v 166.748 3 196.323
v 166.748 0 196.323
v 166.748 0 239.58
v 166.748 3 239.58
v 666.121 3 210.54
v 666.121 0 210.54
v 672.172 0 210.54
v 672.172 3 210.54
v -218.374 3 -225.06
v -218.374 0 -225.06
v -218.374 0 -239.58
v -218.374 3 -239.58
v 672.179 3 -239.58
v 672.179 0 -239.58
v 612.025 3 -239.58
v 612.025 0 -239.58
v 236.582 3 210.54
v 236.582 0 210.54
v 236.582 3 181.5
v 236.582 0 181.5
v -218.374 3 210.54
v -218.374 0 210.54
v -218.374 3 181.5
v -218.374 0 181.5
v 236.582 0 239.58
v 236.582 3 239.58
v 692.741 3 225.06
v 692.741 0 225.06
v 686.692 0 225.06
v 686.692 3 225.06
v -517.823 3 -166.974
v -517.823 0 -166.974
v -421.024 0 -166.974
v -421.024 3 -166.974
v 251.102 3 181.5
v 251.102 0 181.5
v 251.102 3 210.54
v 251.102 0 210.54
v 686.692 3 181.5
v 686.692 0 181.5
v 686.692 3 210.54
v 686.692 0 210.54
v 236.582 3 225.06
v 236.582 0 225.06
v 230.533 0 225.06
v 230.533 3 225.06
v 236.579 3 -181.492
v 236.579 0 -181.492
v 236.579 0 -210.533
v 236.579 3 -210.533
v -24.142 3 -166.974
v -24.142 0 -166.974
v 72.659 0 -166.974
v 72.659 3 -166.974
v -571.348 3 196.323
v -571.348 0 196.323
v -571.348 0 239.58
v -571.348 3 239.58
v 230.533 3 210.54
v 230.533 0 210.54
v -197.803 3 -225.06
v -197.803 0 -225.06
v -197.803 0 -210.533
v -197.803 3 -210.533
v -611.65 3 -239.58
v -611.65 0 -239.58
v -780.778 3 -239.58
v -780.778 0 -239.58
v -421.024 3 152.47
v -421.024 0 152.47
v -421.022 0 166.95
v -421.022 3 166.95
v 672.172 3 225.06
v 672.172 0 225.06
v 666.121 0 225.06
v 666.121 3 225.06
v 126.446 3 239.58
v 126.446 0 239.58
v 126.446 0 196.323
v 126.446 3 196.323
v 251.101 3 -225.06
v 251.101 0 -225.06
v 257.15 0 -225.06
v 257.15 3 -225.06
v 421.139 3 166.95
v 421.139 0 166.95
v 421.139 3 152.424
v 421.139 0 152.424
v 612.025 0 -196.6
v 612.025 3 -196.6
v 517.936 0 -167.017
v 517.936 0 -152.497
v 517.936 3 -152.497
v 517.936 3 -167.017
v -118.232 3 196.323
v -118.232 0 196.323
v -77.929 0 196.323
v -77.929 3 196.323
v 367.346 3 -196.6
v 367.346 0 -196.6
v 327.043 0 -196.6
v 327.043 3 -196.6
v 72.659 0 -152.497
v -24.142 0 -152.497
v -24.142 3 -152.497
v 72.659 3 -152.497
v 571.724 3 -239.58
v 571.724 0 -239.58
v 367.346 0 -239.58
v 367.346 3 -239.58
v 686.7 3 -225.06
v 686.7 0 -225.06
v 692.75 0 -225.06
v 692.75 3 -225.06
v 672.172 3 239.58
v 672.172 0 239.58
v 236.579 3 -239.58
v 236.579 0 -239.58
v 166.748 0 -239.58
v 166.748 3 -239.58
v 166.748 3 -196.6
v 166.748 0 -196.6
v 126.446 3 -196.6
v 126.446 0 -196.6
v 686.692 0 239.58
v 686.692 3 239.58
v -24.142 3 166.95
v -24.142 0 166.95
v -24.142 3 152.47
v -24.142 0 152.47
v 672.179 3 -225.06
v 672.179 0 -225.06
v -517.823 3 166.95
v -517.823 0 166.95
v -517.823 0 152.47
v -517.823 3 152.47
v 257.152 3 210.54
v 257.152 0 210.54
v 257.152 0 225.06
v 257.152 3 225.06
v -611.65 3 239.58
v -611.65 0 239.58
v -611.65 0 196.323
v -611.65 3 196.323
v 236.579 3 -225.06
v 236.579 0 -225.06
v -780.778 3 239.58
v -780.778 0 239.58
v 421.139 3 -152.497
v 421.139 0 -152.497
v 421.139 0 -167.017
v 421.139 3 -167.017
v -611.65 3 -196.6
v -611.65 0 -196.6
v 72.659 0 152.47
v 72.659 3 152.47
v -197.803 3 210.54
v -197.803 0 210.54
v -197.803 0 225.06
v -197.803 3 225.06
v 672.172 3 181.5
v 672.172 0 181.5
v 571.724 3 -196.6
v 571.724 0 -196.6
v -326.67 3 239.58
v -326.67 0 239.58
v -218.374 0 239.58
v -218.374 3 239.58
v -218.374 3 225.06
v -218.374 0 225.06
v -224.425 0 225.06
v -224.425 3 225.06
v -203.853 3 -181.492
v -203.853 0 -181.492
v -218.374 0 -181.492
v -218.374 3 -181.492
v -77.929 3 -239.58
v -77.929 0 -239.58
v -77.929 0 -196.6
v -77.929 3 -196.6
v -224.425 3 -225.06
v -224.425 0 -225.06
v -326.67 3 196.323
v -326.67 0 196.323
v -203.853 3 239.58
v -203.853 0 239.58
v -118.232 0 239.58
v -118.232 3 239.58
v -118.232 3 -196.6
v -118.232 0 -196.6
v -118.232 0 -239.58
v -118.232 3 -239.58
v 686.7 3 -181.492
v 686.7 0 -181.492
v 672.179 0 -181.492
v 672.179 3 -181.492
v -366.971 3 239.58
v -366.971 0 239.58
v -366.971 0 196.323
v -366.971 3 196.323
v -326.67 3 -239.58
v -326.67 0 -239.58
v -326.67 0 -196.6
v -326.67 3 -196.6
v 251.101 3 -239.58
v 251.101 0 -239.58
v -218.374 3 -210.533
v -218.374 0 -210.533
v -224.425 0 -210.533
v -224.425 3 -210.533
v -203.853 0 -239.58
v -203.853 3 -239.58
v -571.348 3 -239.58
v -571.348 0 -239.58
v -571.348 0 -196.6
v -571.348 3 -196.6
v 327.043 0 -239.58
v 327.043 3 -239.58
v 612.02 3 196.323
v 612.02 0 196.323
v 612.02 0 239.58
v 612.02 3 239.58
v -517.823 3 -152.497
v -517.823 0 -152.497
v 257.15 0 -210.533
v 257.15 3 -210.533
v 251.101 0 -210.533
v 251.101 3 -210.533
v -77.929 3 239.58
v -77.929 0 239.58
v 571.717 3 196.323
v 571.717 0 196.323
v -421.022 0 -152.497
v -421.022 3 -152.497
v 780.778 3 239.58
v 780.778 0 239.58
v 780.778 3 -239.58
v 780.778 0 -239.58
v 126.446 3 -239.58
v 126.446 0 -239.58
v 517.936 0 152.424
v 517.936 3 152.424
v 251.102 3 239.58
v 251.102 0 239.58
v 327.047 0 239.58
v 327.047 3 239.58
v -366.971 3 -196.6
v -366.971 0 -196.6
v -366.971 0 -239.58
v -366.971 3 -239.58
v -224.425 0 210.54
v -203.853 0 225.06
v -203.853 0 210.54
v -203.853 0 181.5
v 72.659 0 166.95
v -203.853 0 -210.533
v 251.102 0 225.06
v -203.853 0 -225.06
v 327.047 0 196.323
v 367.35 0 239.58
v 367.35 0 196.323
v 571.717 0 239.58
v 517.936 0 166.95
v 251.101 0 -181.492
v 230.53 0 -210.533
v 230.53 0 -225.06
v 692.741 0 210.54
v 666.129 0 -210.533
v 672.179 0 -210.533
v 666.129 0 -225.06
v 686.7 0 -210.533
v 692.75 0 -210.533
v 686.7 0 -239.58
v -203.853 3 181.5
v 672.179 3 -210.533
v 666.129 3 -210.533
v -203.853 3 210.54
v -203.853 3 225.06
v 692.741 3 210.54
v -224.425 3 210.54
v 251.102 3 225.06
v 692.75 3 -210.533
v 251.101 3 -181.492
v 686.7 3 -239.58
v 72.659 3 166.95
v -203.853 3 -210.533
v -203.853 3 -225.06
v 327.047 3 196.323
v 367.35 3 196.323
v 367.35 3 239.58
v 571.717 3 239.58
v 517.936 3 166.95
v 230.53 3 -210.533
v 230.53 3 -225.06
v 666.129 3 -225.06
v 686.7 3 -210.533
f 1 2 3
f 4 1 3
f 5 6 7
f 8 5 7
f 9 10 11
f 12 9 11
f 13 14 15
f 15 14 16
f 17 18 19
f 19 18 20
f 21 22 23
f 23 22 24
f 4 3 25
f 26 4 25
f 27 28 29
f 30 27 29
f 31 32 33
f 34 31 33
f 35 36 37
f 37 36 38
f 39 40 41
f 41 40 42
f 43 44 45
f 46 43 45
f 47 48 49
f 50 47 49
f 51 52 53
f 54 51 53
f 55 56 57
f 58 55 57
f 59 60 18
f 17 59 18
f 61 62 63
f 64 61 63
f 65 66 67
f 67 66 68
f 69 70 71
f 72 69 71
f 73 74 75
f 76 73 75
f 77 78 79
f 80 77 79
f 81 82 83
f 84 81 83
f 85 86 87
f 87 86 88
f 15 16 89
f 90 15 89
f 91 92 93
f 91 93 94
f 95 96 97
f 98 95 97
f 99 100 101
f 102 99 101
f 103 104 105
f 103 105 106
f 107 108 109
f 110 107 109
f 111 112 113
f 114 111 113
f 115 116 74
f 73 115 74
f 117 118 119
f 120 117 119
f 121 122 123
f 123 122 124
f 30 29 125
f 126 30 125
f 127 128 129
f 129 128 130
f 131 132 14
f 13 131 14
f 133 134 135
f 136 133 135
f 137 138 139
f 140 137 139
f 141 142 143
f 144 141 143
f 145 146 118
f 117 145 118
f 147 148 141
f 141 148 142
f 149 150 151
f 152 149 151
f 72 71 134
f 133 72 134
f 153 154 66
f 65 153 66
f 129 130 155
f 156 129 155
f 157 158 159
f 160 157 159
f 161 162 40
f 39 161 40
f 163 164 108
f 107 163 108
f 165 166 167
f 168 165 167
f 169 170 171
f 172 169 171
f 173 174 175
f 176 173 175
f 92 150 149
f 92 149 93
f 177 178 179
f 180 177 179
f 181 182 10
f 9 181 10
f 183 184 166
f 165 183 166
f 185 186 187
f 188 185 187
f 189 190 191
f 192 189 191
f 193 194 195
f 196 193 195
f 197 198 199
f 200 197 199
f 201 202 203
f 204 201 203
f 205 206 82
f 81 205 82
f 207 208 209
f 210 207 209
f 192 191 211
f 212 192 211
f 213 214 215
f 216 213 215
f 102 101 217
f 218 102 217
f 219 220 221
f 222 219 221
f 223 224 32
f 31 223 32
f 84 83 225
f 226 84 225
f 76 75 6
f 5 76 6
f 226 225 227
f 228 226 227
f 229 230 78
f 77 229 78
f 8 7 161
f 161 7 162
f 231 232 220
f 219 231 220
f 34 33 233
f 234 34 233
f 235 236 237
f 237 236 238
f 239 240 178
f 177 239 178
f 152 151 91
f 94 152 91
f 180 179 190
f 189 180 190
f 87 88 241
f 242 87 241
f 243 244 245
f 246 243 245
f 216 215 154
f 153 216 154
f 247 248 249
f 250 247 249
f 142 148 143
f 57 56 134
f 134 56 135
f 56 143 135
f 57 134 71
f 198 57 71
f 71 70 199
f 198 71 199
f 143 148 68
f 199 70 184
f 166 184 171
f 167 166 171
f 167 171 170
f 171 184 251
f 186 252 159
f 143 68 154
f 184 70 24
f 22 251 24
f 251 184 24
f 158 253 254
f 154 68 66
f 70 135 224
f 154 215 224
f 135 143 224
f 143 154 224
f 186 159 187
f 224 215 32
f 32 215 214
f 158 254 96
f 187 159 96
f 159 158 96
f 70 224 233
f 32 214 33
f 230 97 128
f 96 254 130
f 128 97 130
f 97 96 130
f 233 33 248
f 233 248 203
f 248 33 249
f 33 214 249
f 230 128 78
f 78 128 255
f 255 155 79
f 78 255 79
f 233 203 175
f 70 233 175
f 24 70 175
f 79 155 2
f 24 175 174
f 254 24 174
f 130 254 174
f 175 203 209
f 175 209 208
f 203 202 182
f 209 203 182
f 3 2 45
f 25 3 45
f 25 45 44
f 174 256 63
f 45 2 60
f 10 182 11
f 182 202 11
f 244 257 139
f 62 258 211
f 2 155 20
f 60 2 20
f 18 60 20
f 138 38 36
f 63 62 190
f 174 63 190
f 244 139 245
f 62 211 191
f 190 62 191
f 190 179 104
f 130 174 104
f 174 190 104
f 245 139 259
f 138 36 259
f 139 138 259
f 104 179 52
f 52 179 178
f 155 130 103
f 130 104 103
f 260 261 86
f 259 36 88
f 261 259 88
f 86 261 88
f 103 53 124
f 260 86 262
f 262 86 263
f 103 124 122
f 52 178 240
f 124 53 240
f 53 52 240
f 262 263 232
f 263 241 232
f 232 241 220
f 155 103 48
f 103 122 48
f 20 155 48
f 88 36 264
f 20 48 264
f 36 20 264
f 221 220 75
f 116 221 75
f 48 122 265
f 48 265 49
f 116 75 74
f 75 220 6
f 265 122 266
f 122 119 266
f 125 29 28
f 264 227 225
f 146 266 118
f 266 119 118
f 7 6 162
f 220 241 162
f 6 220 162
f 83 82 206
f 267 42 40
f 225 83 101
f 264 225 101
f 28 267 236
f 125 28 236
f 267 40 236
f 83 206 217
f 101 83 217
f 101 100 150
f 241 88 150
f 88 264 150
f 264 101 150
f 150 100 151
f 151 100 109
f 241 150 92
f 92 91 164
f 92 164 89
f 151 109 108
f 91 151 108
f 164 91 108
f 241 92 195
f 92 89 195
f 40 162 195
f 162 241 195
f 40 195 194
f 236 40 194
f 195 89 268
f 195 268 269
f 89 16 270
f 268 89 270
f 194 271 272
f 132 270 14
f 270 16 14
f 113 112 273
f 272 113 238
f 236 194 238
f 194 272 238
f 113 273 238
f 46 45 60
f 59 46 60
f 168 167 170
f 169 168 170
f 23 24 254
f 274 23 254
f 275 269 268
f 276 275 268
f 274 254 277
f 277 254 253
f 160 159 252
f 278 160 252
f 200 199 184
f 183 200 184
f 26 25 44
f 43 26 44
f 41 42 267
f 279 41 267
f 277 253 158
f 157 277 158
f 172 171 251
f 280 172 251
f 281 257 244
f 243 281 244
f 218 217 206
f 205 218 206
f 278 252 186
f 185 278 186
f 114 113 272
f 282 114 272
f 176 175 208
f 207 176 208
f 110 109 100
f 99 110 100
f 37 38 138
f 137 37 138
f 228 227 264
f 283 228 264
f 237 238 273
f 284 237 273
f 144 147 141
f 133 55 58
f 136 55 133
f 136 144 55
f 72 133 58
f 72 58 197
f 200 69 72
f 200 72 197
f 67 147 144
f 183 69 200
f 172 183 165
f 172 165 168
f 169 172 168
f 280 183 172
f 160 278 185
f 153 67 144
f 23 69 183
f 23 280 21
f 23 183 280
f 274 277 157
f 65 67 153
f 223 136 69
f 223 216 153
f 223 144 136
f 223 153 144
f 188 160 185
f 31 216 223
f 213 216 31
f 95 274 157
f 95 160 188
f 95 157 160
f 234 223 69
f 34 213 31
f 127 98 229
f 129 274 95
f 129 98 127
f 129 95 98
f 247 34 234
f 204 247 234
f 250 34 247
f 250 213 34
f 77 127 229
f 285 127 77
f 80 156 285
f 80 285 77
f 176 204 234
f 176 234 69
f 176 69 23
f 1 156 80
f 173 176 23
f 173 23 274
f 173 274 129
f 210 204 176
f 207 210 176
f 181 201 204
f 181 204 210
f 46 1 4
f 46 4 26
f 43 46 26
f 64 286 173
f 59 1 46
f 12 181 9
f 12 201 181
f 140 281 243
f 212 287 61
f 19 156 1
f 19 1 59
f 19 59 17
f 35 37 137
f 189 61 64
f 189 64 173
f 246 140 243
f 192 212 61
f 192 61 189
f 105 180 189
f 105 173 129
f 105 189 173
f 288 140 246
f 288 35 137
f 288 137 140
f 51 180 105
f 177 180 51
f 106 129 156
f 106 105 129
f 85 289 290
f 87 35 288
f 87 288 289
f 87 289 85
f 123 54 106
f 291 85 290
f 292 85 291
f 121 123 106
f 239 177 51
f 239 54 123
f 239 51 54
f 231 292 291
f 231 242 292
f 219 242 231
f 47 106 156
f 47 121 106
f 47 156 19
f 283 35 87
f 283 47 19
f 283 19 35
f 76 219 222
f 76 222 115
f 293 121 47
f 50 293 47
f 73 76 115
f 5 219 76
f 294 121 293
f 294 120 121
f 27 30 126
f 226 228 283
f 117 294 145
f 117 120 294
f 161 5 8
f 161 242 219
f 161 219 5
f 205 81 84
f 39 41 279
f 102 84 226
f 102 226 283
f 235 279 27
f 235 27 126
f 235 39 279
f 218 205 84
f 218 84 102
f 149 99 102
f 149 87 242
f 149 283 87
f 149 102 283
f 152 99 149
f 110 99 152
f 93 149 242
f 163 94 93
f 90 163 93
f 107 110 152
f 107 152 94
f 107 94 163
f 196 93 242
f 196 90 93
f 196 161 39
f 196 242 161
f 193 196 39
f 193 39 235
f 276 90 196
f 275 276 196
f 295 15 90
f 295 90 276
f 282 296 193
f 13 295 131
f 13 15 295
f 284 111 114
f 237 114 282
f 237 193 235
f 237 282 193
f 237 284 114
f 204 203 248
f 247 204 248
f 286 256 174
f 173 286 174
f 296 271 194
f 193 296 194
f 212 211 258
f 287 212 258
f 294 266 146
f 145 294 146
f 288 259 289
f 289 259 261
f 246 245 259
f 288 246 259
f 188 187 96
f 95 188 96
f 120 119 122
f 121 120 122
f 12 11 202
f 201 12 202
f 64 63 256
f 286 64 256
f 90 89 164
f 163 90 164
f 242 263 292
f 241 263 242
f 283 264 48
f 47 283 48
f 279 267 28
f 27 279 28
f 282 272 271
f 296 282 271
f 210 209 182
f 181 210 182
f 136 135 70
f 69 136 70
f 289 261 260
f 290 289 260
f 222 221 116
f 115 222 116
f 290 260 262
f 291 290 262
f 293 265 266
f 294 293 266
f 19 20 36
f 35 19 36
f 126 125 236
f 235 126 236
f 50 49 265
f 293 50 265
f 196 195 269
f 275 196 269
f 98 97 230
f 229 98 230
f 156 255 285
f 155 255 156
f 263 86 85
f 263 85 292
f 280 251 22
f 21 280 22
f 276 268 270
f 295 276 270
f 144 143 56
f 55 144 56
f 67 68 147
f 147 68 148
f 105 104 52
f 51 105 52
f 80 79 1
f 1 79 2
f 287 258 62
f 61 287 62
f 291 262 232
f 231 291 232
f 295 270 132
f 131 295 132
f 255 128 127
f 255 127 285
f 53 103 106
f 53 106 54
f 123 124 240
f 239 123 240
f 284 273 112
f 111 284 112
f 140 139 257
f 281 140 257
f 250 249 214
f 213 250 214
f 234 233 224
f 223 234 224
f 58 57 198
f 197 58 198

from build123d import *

# Parameters (mm, degrees)
SKETCH1_W           = 96.800297879
SKETCH1_H           = 14.479859902
SKETCH1_H_2         = 14.476525066
SKETCH1_W_2         = 96.796963042
SKETCH1_H_3         = 14.526547613
SKETCH1_H_4         = 14.51987794
BOSS_EXTRUDE1_DEPTH = 3


with BuildPart() as part:
    # Sketch1 → Boss-Extrude1 (new body)
    with BuildSketch(Plane(origin=(0, 0, 0), x_dir=(1, 0, 0), z_dir=(0, 1, 0))):
        Polygon((686.70035272, 239.579653428), (686.70035272, 225.059775488), (692.749746056, 225.059775488), (692.749746056, 210.533227875), (686.70035272, 210.533227875), (686.70035272, 181.491804577), (672.178807362, 181.491804577), (672.178807362, 210.533227875), (666.129414026, 210.533227875), (666.129414026, 225.059775488), (672.178807362, 225.059775488), (672.178807362, 239.579653428), (612.025027325, 239.579653428), (612.025027325, 196.600281152), (571.723528724, 196.600281152), (571.723528724, 239.579653428), (367.346408951, 239.579653428), (367.346408951, 196.600281152), (327.043242933, 196.600281152), (327.043242933, 239.579653428), (251.100679683, 239.579653428), (251.100679683, 225.059775488), (257.150073019, 225.059775488), (257.150073019, 210.533227875), (251.100679683, 210.533227875), (251.100679683, 181.491804577), (236.579134325, 181.491804577), (236.579134325, 210.533227875), (230.529740989, 210.533227875), (230.529740989, 225.059775488), (236.579134325, 225.059775488), (236.579134325, 239.579653428), (166.747658885, 239.579653428), (166.747658885, 196.600281152), (126.446160285, 196.600281152), (126.446160285, 239.579653428), (-77.92929207, 239.579653428), (-77.92929207, 196.600281152), (-118.232458088, 196.600281152), (-118.232458088, 239.579653428), (-203.85271674, 239.579653428), (-203.85271674, 225.059775488), (-197.803323405, 225.059775488), (-197.803323405, 210.533227875), (-203.85271674, 210.533227875), (-203.85271674, 181.491804577), (-218.374262098, 181.491804577), (-218.374262098, 210.533227875), (-224.425322852, 210.533227875), (-224.425322852, 225.059775488), (-218.374262098, 225.059775488), (-218.374262098, 239.579653428), (-326.669741249, 239.579653428), (-326.669741249, 196.600281152), (-366.97123985, 196.600281152), (-366.97123985, 239.579653428), (-571.348359623, 239.579653428), (-571.348359623, 196.600281152), (-611.649858223, 196.600281152), (-611.649858223, 239.579653428), (-780.777756631, 239.579653428), (-780.777756631, -239.579653428), (-611.649858223, -239.579653428), (-611.649858223, -196.323489726), (-571.348359623, -196.323489726), (-571.348359623, -239.579653428), (-366.97123985, -239.579653428), (-366.97123985, -196.323489726), (-326.669741249, -196.323489726), (-326.669741249, -239.579653428), (-218.374262098, -239.579653428), (-218.374262098, -225.059775488), (-224.425322852, -225.059775488), (-224.425322852, -210.539897548), (-218.374262098, -210.539897548), (-218.374262098, -181.500141668), (-203.85271674, -181.500141668), (-203.85271674, -210.539897548), (-197.803323405, -210.539897548), (-197.803323405, -225.059775488), (-203.85271674, -225.059775488), (-203.85271674, -239.579653428), (-118.232458088, -239.579653428), (-118.232458088, -196.323489726), (-77.92929207, -196.323489726), (-77.92929207, -239.579653428), (126.446160285, -239.579653428), (126.446160285, -196.323489726), (166.747658885, -196.323489726), (166.747658885, -239.579653428), (236.582469161, -239.579653428), (236.582469161, -225.059775488), (230.533075826, -225.059775488), (230.533075826, -210.539897548), (236.582469161, -210.539897548), (236.582469161, -181.500141668), (251.102347101, -181.500141668), (251.102347101, -210.539897548), (257.151740437, -210.539897548), (257.151740437, -225.059775488), (251.102347101, -225.059775488), (251.102347101, -239.579653428), (327.046577769, -239.579653428), (327.046577769, -196.323489726), (367.349743788, -196.323489726), (367.349743788, -239.579653428), (571.716859051, -239.579653428), (571.716859051, -196.323489726), (612.02002507, -196.323489726), (612.02002507, -239.579653428), (672.172137689, -239.579653428), (672.172137689, -225.059775488), (666.121076935, -225.059775488), (666.121076935, -210.539897548), (672.172137689, -210.539897548), (672.172137689, -181.500141668), (686.692015629, -181.500141668), (686.692015629, -210.539897548), (692.741408964, -210.539897548), (692.741408964, -225.059775488), (686.692015629, -225.059775488), (686.692015629, -239.579653428), (780.777756631, -239.579653428), (780.777756631, 239.579653428), align=None)
        Polygon((-421.022269168, -166.9502502), (-517.822567047, -166.9502502), (-517.822567047, -152.470390298), (-421.023936586, -152.470390298), align=None, mode=Mode.SUBTRACT)
        Polygon((-421.022269168, 152.497068989), (-517.822567047, 152.497068989), (-517.822567047, 166.973594055), (-421.023936586, 166.973594055), align=None, mode=Mode.SUBTRACT)
        with Locations((24.258434108, -159.710320249)):
            Rectangle(SKETCH1_W, SKETCH1_H, mode=Mode.SUBTRACT)
        with Locations((24.258434108, 159.735331522)):
            Rectangle(SKETCH1_W, SKETCH1_H_2, mode=Mode.SUBTRACT)
        with Locations((469.537469965, -159.686976394)):
            Rectangle(SKETCH1_W_2, SKETCH1_H_3, mode=Mode.SUBTRACT)
        with Locations((469.537469965, 159.757007959)):
            Rectangle(SKETCH1_W_2, SKETCH1_H_4, mode=Mode.SUBTRACT)
    extrude(amount=BOSS_EXTRUDE1_DEPTH)


solid = part.part
